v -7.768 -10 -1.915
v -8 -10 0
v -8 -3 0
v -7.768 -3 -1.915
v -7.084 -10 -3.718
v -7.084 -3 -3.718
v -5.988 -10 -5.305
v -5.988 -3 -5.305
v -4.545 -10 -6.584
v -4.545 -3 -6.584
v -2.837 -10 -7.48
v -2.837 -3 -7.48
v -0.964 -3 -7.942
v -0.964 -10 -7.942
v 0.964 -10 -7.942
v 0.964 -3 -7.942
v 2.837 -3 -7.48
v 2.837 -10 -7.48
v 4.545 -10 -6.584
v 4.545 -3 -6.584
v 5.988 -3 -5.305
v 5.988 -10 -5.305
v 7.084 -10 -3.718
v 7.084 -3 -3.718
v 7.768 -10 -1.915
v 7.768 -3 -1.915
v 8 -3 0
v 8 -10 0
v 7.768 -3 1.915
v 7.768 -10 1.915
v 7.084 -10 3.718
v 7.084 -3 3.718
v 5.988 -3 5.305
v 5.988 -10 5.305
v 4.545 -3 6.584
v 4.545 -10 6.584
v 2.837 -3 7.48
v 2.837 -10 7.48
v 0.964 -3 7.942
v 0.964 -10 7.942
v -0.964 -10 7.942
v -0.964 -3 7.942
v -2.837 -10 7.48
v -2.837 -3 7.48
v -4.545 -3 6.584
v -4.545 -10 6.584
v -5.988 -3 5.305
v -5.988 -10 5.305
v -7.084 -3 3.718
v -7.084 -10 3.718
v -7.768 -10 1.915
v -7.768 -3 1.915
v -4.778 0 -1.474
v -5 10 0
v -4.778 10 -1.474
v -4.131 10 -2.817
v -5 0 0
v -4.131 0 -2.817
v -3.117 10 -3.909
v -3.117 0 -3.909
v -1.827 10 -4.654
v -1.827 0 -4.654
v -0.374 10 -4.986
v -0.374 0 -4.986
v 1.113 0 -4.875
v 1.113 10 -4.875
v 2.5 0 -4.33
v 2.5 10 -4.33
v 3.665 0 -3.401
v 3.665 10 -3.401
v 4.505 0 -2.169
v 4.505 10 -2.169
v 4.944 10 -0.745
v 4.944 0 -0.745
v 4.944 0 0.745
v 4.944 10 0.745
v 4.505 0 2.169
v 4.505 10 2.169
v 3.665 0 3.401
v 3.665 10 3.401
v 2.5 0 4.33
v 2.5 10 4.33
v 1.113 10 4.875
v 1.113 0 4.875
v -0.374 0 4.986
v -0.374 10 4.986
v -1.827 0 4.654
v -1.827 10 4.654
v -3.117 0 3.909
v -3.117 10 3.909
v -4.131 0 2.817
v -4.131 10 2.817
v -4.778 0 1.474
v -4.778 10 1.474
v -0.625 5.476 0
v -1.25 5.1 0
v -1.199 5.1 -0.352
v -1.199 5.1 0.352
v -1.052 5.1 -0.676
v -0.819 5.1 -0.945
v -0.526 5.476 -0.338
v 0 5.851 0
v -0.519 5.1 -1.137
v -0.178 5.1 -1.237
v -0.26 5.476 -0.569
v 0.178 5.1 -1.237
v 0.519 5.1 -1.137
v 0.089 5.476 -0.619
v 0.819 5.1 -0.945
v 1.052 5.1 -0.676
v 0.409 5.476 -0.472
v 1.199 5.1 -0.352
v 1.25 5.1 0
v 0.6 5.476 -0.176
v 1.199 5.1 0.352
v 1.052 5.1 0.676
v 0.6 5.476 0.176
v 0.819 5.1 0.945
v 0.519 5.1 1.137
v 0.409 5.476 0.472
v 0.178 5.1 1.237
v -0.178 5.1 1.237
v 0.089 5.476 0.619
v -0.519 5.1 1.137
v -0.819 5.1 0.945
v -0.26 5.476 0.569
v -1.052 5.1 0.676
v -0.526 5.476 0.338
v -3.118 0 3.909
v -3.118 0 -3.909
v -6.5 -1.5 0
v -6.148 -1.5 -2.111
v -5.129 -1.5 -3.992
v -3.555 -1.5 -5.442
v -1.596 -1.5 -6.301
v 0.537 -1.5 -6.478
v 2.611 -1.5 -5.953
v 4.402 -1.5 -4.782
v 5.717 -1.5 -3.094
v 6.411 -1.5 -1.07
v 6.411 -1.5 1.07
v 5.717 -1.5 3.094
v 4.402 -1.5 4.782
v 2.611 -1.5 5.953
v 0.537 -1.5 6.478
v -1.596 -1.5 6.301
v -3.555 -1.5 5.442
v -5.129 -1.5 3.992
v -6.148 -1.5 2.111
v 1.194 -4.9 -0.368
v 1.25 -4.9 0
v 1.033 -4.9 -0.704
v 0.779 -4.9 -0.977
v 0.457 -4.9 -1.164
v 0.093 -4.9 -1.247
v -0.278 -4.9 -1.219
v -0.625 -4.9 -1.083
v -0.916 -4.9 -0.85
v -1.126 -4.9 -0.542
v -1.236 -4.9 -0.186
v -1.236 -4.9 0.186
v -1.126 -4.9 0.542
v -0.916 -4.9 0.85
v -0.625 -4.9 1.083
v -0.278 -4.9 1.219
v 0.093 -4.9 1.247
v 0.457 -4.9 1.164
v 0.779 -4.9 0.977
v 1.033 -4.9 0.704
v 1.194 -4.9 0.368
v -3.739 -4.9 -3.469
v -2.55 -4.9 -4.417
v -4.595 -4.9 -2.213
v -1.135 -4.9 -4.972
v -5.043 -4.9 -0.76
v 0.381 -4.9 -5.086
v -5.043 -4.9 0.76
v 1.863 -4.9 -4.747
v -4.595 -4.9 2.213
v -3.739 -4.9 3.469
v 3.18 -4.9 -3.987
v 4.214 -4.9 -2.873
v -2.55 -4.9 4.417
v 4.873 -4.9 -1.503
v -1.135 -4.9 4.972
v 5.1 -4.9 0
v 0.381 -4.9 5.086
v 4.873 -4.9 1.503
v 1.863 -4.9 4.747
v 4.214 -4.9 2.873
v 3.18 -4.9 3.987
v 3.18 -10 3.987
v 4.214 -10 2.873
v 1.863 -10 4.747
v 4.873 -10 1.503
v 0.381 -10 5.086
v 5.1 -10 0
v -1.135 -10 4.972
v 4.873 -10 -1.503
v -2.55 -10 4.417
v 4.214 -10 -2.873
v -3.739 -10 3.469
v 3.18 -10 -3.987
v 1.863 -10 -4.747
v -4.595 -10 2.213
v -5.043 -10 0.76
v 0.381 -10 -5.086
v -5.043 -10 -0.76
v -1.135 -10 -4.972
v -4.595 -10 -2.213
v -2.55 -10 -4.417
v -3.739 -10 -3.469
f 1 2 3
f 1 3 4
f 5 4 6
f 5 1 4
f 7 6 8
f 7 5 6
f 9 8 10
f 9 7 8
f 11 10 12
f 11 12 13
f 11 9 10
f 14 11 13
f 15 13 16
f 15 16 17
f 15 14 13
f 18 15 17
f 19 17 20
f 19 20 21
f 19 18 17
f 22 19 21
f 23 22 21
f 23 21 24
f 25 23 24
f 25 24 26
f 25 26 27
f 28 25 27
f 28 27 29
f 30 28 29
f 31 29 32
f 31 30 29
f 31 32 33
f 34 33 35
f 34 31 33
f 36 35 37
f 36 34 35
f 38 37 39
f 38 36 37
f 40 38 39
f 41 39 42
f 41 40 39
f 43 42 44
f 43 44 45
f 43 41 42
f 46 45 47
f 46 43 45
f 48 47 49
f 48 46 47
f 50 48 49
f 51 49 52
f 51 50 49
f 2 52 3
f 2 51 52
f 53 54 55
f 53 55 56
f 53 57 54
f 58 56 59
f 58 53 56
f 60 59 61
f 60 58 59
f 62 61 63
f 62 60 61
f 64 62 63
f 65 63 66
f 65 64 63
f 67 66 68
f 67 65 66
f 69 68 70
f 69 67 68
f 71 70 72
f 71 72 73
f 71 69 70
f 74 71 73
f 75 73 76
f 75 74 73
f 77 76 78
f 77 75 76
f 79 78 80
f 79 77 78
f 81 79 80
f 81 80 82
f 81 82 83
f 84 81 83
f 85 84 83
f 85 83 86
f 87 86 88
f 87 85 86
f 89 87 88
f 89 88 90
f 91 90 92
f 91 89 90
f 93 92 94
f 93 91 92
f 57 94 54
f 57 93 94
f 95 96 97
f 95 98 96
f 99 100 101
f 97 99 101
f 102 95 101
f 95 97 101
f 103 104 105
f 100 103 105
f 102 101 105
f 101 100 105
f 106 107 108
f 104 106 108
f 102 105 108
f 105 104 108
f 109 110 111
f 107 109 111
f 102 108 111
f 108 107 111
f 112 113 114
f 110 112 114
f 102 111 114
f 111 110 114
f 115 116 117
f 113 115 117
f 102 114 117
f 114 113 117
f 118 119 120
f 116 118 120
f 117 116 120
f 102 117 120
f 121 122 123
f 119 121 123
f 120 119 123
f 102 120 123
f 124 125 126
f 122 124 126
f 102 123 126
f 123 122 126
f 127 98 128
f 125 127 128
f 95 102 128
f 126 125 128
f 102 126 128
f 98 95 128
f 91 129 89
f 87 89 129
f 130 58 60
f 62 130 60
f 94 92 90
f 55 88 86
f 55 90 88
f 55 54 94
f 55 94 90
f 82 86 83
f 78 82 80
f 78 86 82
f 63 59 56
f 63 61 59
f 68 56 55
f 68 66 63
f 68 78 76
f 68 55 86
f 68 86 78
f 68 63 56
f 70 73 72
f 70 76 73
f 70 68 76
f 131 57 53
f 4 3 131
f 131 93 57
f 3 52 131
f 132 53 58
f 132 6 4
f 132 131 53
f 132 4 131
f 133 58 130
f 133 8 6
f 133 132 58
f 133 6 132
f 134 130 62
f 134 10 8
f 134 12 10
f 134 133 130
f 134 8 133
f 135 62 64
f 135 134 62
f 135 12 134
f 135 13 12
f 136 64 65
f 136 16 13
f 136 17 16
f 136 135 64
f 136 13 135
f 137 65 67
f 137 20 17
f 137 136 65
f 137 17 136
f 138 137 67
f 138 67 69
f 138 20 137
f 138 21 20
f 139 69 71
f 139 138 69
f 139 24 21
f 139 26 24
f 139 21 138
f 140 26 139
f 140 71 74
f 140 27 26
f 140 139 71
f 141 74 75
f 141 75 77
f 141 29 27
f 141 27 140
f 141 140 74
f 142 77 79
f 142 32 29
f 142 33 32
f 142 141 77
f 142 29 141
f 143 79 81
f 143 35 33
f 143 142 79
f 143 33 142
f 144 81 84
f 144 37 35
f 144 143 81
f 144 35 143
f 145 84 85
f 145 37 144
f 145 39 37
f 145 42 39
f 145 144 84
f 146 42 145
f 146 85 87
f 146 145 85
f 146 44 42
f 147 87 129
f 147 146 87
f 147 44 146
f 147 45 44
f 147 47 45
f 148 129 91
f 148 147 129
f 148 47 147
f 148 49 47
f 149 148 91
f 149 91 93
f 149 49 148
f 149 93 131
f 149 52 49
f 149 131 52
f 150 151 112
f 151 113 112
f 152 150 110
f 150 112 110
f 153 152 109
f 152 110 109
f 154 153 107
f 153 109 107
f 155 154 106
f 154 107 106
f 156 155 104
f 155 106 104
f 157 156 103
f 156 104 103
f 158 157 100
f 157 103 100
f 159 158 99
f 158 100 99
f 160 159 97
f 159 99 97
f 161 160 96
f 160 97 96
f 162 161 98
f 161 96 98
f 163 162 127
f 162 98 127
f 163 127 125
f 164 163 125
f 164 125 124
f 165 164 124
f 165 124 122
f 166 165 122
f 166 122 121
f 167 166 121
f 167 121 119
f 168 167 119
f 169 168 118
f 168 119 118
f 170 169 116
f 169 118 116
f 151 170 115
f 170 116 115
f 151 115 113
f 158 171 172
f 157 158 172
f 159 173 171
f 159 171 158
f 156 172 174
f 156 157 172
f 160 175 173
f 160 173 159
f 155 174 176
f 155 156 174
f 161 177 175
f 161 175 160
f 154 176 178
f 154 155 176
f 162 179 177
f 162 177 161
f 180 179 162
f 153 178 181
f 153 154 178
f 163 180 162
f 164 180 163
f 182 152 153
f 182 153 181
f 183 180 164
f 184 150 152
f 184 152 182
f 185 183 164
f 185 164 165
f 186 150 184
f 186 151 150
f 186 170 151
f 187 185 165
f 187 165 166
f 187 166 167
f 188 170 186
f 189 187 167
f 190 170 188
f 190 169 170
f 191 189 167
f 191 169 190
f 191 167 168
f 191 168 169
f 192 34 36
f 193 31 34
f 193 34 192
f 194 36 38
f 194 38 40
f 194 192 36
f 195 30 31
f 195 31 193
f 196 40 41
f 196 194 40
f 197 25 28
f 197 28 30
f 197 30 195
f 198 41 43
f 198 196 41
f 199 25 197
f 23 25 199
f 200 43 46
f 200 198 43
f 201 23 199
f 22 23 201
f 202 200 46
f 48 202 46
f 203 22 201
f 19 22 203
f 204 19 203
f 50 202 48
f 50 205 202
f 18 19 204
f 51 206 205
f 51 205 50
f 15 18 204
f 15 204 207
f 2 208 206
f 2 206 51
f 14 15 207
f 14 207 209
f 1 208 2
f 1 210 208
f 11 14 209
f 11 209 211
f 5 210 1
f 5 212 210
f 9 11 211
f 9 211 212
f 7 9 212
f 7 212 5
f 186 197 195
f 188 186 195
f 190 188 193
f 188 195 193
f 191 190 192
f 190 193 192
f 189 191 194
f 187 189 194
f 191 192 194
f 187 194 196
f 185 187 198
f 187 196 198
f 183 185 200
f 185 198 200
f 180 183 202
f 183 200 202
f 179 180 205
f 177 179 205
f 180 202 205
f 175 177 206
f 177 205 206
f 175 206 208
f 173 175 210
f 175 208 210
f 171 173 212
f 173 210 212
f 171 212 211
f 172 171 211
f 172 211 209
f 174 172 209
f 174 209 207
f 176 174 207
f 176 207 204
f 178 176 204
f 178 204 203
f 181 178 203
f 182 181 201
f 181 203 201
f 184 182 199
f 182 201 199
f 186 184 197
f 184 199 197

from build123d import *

# Parameters (mm, degrees)
CHAMFER_1_SIZE       = 3
SKETCH_4_R           = 5.1
CUT_EXTRUDE_1_DEPTH  = 5.1
HOLE_WIZARD_M3_D     = 2.5
HOLE_WIZARD_M3_DEPTH = 10
HOLE_WIZARD_M3_TIP   = 0.751075774


with BuildPart() as part:
    # Эскиз1 → Revolve 482 (revolve)
    with BuildSketch(Plane.XY):
        Polygon((0, 10), (-5, 10), (-5, 0), (-8, 0), (-8, -10), (0, -10), align=None)
    revolve(axis=Axis((0, 10, 0), (0, -1, 0)))

    # Фаска1
    chamfer_1_edges = [part.edges().sort_by_distance(p)[0] for p in [
        (8, 0, 0),
    ]]
    chamfer(chamfer_1_edges, length=CHAMFER_1_SIZE - 0.0001)  # a hair under: the kernel refuses the full size

    # Эскиз4 → Вырез-Вытянуть1 (cut)
    with BuildSketch(Plane.XZ.offset(10)):
        Circle(SKETCH_4_R)
    extrude(amount=-CUT_EXTRUDE_1_DEPTH, mode=Mode.SUBTRACT)

    # Крепление магнита M3
    with Locations(Plane(origin=(0, -4.9, 0), x_dir=(-1, 0, 0), z_dir=(0, -1, 0))):
        with Locations((0, 0)):
            Hole(HOLE_WIZARD_M3_D / 2, depth=HOLE_WIZARD_M3_DEPTH)
            with Locations((0, 0, -(HOLE_WIZARD_M3_DEPTH + HOLE_WIZARD_M3_TIP / 2))):  # 118° drill point
                Cone(0, HOLE_WIZARD_M3_D / 2, HOLE_WIZARD_M3_TIP, mode=Mode.SUBTRACT)


solid = part.part
